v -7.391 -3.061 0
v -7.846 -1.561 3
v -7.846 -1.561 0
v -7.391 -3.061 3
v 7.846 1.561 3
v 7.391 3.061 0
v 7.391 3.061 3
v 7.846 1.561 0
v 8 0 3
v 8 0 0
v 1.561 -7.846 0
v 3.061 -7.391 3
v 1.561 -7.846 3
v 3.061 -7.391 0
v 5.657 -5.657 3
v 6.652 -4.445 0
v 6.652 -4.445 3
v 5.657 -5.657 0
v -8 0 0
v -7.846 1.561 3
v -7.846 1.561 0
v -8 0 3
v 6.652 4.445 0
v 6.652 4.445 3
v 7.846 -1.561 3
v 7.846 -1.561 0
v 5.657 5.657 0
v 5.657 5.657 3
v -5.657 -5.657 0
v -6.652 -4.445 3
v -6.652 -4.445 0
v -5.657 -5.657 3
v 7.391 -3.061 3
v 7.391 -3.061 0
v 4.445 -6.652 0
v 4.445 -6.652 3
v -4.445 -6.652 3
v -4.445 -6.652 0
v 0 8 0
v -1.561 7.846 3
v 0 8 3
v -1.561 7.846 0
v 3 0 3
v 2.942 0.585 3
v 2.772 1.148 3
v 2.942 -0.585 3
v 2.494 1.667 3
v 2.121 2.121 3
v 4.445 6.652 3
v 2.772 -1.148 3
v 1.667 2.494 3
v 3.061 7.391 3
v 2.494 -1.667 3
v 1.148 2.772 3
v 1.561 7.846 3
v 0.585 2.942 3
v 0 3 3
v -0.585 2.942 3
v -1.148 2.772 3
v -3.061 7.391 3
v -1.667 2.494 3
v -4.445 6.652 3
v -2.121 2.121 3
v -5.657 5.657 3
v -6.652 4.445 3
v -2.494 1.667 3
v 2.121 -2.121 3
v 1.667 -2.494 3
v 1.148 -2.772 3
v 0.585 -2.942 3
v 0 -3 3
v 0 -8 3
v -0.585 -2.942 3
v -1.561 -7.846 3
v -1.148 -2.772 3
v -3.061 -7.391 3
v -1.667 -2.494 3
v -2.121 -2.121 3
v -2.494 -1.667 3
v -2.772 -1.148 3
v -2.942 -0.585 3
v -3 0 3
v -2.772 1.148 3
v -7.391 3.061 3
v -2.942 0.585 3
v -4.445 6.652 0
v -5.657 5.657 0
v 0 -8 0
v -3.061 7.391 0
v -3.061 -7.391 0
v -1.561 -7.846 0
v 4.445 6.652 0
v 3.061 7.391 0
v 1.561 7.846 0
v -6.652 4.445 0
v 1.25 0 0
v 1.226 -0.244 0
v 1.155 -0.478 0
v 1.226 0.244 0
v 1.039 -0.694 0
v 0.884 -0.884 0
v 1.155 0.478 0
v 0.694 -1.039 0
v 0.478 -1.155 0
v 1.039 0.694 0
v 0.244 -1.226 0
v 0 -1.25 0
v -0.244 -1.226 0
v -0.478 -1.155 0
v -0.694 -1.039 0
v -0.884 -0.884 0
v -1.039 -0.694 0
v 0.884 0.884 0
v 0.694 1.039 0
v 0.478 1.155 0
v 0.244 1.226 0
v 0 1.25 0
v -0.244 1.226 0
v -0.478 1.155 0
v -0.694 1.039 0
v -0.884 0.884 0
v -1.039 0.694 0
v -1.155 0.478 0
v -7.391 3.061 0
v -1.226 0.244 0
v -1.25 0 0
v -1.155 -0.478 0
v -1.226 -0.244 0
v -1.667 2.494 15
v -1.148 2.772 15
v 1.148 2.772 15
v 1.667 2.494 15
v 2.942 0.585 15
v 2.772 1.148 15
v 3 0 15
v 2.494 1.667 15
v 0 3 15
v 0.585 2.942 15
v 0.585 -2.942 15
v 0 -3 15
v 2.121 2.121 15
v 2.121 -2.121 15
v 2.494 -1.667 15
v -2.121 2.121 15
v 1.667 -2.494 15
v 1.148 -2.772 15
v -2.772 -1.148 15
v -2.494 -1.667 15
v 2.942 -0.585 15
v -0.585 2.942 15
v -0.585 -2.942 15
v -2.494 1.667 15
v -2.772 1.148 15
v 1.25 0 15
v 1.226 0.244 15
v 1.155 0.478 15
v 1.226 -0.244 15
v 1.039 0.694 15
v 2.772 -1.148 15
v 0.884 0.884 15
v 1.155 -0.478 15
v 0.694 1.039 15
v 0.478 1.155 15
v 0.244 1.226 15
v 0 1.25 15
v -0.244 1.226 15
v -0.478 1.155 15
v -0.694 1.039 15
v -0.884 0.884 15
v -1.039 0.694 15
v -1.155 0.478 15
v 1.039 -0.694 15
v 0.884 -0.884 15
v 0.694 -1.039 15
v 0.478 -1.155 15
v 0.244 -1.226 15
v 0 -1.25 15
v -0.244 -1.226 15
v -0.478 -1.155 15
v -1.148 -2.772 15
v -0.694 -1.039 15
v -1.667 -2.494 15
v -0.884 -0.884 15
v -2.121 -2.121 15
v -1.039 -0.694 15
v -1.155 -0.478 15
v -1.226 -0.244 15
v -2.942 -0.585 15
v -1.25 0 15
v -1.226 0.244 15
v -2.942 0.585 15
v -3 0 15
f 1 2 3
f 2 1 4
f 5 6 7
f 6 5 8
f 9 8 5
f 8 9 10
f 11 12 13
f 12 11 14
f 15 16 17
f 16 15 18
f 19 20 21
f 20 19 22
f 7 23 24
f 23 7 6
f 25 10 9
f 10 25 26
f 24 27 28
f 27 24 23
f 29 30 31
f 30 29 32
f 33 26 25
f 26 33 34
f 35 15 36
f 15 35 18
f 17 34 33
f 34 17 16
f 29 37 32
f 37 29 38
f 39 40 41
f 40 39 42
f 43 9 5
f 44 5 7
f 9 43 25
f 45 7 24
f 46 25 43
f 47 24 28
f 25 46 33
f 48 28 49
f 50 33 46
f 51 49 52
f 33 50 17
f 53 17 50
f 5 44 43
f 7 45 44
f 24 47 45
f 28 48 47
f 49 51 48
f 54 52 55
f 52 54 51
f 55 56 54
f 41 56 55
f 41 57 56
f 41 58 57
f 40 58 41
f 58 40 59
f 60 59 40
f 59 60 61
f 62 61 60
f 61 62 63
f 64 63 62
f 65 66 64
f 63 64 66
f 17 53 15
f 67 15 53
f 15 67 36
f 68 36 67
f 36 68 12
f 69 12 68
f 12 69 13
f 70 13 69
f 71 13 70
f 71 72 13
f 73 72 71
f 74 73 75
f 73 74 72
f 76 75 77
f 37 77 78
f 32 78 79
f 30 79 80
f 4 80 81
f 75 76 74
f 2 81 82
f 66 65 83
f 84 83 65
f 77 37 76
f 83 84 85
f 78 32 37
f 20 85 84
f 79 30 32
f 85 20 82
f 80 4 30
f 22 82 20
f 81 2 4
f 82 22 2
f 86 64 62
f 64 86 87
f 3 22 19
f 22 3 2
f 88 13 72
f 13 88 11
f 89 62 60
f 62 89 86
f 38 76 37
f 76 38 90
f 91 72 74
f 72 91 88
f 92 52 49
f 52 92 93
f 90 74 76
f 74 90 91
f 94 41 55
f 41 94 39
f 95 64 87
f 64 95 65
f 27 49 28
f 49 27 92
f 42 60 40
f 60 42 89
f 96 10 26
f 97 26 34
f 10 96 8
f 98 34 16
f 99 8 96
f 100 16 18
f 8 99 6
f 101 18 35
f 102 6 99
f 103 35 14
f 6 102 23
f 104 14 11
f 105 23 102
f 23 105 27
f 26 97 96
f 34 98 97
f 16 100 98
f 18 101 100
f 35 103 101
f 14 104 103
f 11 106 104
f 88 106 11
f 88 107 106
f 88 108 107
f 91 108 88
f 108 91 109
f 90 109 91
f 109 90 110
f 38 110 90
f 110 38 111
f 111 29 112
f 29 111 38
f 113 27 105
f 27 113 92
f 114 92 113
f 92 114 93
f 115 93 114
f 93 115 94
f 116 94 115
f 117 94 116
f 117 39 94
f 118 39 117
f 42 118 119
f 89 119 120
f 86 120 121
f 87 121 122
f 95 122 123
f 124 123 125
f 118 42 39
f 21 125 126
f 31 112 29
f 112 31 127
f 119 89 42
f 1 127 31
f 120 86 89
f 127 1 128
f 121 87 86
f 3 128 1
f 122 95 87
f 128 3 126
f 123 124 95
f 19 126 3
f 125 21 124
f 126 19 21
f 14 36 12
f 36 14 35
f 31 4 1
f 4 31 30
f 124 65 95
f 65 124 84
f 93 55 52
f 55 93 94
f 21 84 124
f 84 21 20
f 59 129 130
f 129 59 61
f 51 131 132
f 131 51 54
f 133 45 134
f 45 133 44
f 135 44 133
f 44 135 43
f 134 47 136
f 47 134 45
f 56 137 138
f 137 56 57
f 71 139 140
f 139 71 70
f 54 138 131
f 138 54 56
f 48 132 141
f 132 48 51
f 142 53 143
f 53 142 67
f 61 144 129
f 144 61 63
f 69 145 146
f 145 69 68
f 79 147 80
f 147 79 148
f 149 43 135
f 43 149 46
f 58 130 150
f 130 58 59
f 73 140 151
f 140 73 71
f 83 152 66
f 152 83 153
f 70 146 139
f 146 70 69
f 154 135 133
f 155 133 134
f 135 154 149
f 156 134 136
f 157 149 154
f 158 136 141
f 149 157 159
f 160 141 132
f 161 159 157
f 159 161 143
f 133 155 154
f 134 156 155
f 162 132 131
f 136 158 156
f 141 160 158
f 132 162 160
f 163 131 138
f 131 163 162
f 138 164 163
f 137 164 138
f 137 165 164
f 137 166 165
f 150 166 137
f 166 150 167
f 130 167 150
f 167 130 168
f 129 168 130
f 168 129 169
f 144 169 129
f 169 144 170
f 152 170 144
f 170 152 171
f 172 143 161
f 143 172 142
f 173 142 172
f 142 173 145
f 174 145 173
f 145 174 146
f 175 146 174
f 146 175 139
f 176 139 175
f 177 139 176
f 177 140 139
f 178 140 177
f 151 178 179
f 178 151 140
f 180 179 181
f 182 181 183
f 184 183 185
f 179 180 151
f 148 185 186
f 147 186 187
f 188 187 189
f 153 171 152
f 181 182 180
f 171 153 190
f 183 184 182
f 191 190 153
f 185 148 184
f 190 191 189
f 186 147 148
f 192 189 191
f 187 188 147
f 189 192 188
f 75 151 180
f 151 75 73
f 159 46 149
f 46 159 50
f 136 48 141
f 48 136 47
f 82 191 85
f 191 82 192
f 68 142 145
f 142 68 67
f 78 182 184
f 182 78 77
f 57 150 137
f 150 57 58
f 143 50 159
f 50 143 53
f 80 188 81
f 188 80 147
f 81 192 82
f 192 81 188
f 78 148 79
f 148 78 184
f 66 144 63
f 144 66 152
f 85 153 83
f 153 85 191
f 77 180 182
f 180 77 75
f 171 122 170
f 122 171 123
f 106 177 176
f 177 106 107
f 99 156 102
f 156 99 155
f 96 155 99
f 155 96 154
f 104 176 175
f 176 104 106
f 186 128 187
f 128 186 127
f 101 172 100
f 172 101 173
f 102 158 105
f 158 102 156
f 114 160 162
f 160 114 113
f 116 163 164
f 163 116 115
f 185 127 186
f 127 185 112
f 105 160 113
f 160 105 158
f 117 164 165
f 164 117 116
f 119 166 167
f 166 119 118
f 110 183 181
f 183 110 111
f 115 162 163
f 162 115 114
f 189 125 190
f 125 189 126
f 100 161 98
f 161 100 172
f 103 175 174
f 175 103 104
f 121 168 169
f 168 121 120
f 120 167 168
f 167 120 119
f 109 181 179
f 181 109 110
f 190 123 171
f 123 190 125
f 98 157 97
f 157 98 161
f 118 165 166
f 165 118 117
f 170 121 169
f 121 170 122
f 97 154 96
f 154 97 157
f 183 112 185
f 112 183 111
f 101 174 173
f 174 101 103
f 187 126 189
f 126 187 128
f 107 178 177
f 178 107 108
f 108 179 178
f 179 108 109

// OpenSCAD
$fn = 32;

// ----------------------------------------------------------------------
// Micro post: flanged post, 5-20 mm class
// ----------------------------------------------------------------------

// --- parameters (mm) ---
post_d = 6;               // post diameter
post_h = 12;              // post height above the flange
flange_d = 16;            // flange diameter
flange_t = 3;             // flange thickness
bore_d = 2.5;             // through bore

total_h = post_h + flange_t;  // overall height

difference() {
  union() {
    cylinder(h = flange_t, d = flange_d);
    translate([0, 0, flange_t]) cylinder(h = post_h, d = post_d);
  }
  translate([0, 0, -1]) cylinder(h = total_h + 2, d = bore_d);
}
